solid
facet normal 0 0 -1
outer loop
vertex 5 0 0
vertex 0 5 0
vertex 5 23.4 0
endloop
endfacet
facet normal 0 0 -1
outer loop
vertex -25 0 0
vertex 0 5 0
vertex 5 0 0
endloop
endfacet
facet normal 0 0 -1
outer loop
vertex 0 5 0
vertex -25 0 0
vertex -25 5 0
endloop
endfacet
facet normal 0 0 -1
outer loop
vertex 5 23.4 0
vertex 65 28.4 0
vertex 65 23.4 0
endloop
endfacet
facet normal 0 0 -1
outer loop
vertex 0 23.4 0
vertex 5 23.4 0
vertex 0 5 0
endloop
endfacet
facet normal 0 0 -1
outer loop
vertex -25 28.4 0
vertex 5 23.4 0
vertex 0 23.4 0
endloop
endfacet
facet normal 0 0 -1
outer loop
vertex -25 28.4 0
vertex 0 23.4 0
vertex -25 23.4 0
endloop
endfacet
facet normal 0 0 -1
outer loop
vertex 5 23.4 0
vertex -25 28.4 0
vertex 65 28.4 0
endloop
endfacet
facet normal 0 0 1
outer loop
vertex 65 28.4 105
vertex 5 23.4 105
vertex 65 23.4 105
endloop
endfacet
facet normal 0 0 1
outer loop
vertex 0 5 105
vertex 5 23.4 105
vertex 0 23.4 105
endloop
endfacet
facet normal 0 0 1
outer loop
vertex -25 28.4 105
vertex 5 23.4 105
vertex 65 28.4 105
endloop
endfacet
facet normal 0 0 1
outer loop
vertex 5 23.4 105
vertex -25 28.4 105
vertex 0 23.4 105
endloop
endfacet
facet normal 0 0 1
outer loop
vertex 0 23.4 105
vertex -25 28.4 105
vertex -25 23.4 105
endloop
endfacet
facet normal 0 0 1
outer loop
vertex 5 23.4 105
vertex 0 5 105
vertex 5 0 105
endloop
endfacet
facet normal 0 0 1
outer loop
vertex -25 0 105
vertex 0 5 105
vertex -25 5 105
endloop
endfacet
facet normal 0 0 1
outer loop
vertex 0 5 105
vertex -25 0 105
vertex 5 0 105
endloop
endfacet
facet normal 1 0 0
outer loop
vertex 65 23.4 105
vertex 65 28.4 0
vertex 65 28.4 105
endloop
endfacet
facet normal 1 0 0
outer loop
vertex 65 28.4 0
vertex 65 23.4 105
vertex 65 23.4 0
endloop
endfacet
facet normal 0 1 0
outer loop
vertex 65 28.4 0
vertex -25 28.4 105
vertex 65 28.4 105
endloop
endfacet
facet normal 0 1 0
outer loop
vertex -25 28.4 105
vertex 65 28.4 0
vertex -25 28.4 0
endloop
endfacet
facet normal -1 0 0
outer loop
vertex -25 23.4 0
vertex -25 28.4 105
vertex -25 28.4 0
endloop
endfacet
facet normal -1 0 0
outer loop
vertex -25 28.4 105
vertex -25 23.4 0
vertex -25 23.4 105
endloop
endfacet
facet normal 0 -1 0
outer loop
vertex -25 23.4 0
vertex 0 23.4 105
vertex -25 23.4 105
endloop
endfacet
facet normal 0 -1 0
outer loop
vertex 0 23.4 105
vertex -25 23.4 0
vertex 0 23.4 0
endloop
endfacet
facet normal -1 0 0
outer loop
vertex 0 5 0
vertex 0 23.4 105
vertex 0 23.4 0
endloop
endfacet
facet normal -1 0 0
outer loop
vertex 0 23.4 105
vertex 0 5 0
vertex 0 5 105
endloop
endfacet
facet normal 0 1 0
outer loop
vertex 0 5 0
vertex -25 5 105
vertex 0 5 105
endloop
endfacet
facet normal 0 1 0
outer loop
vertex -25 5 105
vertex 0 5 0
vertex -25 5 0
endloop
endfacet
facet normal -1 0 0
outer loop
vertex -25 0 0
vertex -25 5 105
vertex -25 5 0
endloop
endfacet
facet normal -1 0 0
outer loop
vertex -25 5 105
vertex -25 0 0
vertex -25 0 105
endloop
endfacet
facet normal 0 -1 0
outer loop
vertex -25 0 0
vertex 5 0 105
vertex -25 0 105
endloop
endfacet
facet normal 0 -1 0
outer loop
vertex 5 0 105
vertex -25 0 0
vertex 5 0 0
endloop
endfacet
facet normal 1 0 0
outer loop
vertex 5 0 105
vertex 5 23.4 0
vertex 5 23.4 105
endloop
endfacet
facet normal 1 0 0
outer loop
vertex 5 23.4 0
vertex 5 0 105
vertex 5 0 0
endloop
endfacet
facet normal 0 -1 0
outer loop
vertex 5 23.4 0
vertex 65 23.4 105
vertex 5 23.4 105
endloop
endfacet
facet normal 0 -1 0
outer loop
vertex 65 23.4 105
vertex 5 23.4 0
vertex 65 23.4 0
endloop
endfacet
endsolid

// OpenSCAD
// Dimensions (mm)
shelf_thickness = 18;
extrusion_length = 105;

// Profile dimensions
spine_x_start = 0;
spine_x_end = 5;
spine_y_start = 0;
spine_y_end = 28.4;

bottom_jaw_x_start = -25;
bottom_jaw_x_end = 5;
bottom_jaw_y_start = 0;
bottom_jaw_y_end = 5;

top_jaw_arm_x_start = -25;
top_jaw_arm_x_end = 65;
top_jaw_arm_y_start = 23.4;
top_jaw_arm_y_end = 28.4;

// Hole parameters
hole_diameter = 20;
hole_radius = hole_diameter / 2;
hole_x = 42;
hole_z_positions = [17.5, 52.5, 87.5];

// Quality
$fn = 64;

// Build the part
difference() {
    // Extrude the C-shaped profile along Z
    linear_extrude(height = extrusion_length, convexity = 10) {
        union() {
            // Spine
            square([spine_x_end - spine_x_start, spine_y_end - spine_y_start], center = false);
            translate([spine_x_start, spine_y_start])
                square([spine_x_end - spine_x_start, spine_y_end - spine_y_start]);

            // Bottom jaw
            translate([bottom_jaw_x_start, bottom_jaw_y_start])
                square([bottom_jaw_x_end - bottom_jaw_x_start, bottom_jaw_y_end - bottom_jaw_y_start]);

            // Top jaw and arm
            translate([top_jaw_arm_x_start, top_jaw_arm_y_start])
                square([top_jaw_arm_x_end - top_jaw_arm_x_start, top_jaw_arm_y_end - top_jaw_arm_y_start]);
        }
    }

    // Cut holes through the arm along Z
    for (z_pos = hole_z_positions) {
        translate([hole_x, 0, z_pos])
            cylinder(h = extrusion_length + 2, r = hole_radius, center = true, $fn = 64);
    }
}
